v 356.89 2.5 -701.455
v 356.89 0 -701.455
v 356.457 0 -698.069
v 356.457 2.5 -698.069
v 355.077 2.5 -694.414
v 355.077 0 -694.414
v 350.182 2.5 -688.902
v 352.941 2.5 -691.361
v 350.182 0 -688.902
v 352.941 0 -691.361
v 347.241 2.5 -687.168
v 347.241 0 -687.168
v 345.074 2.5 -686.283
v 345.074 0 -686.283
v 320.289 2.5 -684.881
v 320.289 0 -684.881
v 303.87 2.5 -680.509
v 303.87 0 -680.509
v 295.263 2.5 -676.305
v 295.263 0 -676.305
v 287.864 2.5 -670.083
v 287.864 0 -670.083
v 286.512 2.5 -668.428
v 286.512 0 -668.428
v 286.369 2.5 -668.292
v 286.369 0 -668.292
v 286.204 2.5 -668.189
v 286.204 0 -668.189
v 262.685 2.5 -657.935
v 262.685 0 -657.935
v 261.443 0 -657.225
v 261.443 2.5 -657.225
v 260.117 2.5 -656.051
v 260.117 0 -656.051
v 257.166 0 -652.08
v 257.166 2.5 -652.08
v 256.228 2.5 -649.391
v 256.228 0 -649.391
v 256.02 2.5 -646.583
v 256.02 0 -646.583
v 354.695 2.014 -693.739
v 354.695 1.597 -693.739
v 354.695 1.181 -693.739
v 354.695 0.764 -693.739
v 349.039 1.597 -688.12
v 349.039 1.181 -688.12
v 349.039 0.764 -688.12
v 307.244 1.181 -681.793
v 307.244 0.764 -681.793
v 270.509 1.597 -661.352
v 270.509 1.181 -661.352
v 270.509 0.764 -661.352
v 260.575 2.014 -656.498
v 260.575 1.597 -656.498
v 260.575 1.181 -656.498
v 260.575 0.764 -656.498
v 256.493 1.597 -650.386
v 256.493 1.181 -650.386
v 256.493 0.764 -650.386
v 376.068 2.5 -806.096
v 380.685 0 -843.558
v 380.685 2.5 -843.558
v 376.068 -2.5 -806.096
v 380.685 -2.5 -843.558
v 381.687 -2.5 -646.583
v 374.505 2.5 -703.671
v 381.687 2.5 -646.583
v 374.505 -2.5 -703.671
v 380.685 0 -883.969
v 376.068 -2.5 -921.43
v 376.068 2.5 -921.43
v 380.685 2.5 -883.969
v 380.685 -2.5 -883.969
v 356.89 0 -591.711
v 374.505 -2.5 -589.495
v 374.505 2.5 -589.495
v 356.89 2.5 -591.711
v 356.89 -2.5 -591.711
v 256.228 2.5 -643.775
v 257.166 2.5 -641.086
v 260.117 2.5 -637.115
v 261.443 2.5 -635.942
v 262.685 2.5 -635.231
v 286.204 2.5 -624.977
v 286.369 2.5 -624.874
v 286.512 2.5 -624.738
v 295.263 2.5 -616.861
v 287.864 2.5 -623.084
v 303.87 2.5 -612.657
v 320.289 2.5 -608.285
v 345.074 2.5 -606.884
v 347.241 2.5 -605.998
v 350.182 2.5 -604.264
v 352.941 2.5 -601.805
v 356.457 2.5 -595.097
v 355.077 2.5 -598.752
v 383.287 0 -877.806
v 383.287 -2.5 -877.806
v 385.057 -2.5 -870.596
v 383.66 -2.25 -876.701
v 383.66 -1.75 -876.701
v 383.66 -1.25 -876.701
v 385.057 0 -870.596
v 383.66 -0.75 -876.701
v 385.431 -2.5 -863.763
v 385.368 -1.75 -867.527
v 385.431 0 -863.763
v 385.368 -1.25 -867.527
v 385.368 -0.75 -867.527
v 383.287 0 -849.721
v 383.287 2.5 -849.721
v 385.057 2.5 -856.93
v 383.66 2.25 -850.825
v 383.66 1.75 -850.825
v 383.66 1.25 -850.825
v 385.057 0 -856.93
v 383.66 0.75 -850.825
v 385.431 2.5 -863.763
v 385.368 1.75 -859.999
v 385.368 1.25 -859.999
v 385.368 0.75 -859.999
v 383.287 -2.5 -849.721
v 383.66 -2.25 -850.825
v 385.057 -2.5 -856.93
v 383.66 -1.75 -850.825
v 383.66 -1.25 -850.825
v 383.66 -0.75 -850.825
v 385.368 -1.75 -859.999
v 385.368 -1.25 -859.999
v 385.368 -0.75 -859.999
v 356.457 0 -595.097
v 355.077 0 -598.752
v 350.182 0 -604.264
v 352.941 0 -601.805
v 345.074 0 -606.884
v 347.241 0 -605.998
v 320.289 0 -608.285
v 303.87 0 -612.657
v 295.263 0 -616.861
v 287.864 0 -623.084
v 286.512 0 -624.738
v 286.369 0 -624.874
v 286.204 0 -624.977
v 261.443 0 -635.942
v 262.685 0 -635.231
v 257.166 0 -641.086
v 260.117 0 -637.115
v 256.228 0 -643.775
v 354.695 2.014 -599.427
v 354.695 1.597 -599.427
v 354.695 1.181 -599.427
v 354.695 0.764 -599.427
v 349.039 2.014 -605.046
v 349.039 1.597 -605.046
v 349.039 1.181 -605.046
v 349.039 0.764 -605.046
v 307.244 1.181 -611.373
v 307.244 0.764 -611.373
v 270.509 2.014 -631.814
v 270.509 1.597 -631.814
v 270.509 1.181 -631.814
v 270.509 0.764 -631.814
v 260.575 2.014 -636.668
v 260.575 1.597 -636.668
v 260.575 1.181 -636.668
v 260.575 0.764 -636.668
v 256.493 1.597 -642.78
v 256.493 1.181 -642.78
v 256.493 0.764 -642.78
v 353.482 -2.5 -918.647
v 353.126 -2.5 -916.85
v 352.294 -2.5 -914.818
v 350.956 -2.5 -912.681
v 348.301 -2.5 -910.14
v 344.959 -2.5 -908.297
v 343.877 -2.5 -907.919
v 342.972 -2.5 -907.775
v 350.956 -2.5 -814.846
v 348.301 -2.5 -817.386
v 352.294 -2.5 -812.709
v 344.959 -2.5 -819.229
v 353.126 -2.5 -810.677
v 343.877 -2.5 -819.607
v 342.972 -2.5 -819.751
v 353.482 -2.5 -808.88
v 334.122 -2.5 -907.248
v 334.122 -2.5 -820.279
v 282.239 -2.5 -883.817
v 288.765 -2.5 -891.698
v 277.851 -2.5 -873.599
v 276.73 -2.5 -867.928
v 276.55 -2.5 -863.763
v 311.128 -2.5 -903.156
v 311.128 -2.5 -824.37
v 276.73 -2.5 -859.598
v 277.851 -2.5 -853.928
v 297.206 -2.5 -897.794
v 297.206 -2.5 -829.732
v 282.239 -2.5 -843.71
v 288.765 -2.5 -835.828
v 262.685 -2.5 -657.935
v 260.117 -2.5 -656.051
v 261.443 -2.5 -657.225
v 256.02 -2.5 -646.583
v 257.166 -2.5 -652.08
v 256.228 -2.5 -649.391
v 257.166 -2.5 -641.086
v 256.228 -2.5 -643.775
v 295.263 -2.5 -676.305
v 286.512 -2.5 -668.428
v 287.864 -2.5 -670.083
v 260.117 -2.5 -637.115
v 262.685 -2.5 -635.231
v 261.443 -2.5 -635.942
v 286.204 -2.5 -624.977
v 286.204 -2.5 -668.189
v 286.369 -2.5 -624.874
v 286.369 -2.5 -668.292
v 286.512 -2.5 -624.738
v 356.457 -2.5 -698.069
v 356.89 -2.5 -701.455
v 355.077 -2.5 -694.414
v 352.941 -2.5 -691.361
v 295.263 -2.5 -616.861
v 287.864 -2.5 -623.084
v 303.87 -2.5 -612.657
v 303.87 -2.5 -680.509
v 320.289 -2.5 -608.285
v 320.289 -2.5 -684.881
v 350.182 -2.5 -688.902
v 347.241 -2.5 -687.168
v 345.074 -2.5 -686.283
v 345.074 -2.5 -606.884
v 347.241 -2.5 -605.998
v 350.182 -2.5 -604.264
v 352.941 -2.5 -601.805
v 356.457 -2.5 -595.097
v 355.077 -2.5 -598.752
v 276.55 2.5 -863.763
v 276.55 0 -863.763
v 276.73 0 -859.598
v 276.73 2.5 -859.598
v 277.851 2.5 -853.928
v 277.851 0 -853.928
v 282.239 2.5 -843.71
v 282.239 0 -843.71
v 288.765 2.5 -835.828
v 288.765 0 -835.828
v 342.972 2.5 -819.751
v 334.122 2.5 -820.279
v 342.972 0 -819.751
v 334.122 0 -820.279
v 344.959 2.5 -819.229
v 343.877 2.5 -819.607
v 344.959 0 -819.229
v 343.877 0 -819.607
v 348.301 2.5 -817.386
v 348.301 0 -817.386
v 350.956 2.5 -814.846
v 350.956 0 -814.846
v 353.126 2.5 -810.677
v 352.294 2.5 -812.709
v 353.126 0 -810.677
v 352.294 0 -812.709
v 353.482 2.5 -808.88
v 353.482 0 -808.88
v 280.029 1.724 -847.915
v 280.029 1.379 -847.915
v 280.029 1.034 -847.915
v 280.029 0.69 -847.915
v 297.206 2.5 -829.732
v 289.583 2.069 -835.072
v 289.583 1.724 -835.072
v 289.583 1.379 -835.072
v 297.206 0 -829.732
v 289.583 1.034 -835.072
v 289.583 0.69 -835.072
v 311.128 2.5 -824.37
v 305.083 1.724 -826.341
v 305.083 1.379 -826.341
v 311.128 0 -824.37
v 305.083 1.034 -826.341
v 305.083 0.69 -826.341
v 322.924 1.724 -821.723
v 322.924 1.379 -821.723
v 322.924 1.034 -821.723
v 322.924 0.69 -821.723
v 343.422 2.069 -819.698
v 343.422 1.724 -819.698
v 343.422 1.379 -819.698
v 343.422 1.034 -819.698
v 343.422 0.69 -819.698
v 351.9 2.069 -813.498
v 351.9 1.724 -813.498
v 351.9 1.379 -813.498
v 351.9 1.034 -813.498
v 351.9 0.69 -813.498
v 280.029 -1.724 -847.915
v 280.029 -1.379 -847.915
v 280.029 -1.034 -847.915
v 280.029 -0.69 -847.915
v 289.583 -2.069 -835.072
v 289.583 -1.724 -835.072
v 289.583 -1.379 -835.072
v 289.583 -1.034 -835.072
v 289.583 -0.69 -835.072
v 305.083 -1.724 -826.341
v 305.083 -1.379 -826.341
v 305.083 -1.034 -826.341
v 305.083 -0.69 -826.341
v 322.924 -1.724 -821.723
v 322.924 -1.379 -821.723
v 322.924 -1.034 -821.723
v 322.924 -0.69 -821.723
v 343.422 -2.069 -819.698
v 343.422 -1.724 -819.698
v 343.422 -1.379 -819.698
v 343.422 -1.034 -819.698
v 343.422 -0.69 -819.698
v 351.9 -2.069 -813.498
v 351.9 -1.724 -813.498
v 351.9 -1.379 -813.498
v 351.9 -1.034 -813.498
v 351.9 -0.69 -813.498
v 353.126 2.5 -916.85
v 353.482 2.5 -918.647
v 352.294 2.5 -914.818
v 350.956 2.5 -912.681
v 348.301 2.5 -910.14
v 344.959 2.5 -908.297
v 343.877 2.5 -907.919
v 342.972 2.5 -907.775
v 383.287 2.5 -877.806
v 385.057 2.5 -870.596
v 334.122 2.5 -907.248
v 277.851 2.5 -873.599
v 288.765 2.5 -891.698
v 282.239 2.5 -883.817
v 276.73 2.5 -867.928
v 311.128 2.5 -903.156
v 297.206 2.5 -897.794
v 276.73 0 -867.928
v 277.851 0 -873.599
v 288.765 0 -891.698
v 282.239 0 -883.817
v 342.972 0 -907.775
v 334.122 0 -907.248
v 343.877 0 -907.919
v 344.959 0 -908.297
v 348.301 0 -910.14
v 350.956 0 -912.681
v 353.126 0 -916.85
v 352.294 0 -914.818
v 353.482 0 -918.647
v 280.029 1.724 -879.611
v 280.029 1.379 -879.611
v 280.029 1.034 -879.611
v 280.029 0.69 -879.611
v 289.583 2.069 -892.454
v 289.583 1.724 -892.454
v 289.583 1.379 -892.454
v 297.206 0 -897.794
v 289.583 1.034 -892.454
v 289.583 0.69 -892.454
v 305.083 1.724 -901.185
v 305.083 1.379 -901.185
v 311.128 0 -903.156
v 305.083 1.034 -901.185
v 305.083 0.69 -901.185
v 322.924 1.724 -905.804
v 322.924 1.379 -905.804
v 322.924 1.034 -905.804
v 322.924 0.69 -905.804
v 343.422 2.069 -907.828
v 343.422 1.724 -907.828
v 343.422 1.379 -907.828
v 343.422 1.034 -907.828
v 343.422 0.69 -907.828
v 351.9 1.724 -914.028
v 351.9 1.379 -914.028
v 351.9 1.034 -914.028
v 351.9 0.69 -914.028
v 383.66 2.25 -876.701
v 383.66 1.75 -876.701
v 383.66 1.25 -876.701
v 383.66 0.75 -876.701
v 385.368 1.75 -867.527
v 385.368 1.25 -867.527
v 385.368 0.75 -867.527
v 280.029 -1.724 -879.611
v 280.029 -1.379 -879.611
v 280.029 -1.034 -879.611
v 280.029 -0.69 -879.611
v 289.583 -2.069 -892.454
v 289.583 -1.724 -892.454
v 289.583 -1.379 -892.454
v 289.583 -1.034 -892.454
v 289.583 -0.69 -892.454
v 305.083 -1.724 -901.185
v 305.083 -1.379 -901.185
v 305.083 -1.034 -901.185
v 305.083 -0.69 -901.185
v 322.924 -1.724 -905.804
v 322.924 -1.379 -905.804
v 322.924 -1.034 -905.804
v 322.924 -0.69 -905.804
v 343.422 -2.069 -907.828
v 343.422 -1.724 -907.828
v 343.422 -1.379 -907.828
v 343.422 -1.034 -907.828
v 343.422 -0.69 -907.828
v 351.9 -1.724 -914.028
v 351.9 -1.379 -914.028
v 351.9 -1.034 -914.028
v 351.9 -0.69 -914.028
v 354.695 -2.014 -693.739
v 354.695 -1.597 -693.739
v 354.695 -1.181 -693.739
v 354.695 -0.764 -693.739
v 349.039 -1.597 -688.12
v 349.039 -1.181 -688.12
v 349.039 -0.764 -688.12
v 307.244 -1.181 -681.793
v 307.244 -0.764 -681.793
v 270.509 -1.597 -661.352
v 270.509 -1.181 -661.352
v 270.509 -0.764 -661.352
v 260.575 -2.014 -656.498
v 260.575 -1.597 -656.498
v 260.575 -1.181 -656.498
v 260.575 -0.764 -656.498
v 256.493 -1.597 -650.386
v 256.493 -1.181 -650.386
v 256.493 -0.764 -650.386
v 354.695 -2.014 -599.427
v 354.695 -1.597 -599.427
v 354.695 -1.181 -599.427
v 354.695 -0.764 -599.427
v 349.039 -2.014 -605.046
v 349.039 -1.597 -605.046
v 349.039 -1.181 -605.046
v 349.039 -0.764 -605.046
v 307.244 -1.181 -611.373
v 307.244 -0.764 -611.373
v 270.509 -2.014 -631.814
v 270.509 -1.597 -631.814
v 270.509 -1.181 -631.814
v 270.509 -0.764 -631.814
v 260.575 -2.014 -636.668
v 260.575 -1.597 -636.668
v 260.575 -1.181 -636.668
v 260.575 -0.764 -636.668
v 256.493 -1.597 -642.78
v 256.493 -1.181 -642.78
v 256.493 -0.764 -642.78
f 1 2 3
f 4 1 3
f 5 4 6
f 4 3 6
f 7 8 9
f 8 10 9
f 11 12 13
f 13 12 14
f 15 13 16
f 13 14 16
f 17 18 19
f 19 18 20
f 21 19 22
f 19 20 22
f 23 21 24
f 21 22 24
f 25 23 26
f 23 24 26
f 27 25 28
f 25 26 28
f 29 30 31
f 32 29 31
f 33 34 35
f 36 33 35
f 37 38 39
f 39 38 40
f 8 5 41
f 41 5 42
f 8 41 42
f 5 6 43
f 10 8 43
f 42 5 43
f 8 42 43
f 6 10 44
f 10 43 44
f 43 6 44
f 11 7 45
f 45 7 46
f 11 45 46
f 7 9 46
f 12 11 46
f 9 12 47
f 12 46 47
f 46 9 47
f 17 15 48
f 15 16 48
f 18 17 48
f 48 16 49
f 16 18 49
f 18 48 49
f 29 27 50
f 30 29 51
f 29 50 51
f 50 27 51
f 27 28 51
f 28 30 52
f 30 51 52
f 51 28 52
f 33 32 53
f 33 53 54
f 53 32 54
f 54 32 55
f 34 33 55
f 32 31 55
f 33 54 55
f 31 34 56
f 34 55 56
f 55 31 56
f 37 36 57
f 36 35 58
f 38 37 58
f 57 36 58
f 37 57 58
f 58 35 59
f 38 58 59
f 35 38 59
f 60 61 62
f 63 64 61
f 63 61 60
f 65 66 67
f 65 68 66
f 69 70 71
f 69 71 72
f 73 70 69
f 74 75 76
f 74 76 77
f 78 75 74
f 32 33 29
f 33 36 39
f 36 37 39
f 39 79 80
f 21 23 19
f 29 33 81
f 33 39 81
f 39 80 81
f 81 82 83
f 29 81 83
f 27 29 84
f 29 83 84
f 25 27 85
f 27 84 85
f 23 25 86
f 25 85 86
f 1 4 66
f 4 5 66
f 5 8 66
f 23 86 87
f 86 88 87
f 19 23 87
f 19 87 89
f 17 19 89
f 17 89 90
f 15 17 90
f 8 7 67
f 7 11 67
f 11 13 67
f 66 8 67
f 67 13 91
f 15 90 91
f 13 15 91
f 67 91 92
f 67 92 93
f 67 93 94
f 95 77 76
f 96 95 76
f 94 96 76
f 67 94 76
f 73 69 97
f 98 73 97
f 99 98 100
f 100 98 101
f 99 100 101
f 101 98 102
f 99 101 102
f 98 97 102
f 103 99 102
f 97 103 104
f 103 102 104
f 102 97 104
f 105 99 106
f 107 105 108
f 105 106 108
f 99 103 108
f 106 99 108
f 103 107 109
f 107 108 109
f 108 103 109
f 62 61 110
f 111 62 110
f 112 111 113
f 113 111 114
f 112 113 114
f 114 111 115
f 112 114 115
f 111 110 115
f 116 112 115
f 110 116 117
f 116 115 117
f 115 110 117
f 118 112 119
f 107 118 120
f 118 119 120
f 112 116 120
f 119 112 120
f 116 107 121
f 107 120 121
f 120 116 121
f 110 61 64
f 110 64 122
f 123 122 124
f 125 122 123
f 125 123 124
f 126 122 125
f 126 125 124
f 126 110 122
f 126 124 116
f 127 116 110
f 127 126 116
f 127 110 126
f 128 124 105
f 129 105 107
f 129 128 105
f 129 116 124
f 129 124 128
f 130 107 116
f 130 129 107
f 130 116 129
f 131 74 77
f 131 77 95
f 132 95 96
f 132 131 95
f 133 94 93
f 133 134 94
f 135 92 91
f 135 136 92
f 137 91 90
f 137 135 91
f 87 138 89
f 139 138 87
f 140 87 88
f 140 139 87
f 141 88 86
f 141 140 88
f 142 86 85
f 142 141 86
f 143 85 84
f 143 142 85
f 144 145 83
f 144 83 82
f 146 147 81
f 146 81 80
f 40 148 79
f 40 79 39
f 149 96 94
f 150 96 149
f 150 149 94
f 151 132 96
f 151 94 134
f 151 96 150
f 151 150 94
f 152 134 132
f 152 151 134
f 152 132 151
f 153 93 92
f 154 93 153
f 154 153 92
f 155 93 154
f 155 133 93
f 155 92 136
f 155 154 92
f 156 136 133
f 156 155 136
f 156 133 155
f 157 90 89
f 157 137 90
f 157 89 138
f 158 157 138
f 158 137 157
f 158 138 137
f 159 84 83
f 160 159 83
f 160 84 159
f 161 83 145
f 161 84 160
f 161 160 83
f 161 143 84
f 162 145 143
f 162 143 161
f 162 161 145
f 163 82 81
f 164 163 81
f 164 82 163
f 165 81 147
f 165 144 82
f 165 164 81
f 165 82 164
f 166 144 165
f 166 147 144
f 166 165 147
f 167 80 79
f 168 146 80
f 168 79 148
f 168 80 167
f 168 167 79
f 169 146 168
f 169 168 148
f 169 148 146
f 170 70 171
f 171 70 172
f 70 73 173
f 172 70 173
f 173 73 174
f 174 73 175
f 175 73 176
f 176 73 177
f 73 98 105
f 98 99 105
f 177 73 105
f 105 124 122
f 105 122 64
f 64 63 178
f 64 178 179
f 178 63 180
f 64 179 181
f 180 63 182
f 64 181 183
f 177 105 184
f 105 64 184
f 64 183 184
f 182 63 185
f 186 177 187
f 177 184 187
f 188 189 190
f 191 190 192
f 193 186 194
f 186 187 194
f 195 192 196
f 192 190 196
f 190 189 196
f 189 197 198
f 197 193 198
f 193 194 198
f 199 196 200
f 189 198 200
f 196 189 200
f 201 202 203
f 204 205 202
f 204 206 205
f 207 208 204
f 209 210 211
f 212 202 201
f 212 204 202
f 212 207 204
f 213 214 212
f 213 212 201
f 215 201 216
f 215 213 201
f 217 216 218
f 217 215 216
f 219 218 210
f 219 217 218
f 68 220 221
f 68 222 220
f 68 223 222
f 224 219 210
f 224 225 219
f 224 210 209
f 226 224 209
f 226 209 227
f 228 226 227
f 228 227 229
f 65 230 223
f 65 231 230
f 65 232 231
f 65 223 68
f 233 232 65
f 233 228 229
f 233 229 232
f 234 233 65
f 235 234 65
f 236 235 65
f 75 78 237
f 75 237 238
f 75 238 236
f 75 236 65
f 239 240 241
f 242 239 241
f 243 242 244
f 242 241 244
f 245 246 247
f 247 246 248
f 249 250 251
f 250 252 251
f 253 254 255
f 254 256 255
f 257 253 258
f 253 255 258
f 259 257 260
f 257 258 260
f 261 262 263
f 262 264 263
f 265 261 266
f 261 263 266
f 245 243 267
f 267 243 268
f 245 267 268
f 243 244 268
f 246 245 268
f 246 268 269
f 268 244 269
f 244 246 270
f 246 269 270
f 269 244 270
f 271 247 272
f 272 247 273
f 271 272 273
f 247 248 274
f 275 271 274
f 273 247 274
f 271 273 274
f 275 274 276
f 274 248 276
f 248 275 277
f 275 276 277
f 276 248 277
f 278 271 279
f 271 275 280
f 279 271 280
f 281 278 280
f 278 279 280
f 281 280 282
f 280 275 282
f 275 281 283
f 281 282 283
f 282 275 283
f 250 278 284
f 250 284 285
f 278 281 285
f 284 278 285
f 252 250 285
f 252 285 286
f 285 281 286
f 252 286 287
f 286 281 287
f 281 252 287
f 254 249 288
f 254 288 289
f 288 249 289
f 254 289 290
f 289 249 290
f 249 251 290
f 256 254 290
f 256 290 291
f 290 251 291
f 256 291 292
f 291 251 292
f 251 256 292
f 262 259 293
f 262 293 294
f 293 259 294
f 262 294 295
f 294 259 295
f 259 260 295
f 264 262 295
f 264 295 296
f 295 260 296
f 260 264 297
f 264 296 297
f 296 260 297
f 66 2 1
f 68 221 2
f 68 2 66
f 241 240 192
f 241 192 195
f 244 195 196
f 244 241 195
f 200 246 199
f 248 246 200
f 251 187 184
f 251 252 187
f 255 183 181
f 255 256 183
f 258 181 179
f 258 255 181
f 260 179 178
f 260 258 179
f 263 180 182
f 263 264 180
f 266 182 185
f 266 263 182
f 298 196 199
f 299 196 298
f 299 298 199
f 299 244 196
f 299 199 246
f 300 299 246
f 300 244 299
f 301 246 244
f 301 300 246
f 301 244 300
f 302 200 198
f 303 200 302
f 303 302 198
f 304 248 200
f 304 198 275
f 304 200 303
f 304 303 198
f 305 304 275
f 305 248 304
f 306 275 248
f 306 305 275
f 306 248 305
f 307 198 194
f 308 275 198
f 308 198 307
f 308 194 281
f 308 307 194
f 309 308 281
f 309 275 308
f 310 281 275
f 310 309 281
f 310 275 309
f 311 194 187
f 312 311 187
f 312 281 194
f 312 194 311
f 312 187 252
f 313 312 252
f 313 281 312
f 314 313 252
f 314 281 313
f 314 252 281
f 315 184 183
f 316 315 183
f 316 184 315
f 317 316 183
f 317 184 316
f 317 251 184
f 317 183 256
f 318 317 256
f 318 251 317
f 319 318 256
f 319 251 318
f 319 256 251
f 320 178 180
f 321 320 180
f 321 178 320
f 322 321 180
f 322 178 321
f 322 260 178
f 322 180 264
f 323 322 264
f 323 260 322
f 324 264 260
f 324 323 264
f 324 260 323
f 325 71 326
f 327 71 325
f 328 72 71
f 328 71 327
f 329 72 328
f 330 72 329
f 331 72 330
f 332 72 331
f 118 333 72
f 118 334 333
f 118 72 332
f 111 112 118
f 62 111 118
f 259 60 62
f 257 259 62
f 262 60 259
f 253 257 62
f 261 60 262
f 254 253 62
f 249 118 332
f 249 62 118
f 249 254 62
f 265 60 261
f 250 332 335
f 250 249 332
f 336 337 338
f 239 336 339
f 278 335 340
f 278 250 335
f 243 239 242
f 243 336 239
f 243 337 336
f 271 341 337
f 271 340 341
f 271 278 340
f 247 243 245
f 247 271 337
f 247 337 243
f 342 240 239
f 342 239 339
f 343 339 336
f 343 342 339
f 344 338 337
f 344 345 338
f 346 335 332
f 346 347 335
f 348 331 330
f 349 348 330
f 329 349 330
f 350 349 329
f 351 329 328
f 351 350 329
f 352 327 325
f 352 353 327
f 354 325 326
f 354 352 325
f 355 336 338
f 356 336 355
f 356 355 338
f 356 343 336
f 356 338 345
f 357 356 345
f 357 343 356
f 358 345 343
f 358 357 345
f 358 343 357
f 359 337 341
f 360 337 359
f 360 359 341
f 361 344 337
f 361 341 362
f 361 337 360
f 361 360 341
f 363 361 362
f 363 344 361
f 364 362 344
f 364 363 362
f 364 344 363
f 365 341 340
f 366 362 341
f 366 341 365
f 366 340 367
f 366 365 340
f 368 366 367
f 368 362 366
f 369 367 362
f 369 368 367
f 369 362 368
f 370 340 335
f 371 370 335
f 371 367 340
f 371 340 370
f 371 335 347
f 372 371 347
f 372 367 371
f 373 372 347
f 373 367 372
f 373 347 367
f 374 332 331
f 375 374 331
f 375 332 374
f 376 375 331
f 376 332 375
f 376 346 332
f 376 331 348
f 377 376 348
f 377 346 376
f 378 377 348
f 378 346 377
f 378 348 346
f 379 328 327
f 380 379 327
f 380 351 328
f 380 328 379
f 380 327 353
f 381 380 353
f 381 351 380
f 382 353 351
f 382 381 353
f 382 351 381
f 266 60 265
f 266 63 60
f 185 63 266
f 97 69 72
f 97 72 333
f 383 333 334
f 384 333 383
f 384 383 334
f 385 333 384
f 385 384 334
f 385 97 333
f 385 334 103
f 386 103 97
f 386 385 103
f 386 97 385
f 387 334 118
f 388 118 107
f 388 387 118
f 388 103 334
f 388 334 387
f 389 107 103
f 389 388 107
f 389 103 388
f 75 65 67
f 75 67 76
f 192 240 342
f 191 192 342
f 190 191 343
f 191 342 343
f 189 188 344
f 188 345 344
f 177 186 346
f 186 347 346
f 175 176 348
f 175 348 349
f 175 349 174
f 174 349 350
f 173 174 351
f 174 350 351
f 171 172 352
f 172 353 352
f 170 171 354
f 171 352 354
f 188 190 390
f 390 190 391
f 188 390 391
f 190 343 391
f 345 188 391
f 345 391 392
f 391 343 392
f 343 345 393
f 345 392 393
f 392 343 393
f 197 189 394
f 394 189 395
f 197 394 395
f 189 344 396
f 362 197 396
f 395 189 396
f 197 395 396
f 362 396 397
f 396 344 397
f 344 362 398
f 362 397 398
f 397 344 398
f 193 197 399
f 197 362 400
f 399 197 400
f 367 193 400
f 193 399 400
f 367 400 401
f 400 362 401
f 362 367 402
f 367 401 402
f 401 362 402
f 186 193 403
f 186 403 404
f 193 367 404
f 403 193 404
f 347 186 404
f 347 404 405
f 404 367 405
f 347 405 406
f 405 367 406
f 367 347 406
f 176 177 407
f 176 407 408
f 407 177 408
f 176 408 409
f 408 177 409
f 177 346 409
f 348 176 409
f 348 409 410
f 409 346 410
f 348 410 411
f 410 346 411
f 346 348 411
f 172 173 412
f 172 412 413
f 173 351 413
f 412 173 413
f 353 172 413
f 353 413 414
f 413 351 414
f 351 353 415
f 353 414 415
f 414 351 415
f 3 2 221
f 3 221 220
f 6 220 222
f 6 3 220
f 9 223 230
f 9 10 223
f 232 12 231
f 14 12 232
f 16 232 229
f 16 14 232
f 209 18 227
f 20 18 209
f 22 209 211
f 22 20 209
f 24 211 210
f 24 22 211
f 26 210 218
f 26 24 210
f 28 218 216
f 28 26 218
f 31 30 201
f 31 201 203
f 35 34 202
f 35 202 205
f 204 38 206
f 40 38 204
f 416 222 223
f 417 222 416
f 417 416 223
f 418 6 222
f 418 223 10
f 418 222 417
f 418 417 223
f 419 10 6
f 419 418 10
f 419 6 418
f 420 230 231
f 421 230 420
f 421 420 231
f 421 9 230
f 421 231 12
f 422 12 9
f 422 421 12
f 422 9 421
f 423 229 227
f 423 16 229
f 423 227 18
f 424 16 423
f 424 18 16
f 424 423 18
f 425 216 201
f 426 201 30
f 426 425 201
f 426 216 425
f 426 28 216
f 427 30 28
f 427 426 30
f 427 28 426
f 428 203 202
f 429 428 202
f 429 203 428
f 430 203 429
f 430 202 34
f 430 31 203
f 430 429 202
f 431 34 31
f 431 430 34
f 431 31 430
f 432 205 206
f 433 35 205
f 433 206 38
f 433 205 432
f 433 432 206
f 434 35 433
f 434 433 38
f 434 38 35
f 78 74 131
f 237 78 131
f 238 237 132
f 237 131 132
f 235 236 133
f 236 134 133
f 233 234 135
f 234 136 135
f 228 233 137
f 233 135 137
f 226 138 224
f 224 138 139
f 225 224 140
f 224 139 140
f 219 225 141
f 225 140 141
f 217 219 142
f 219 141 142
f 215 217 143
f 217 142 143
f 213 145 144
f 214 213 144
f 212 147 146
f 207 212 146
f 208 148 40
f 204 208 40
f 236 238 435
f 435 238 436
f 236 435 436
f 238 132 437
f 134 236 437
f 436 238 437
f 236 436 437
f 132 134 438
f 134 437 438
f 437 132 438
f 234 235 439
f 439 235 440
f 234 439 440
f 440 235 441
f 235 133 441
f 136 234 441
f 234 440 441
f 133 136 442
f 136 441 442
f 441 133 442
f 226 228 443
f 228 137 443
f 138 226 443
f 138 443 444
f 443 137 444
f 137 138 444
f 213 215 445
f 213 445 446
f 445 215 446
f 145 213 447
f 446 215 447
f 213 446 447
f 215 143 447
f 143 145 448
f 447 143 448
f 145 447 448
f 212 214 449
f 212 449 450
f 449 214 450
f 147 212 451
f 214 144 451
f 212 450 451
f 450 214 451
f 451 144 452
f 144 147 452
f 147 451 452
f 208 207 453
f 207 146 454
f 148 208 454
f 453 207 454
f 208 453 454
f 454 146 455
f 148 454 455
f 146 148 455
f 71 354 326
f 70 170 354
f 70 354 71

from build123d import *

# Parameters (mm, degrees)
F2_DEPTH = 2.5
F3_DEPTH = 2.5


with BuildPart() as f2:
    # F0 (on Front) → F2 (new body, symmetric)
    with BuildSketch(Plane.XZ):
        with BuildLine():
            add(Edge.make_bspline(
                [(276.5497267246, -863.7632131577), (276.54139154, -862.7410607928), (276.5242140475, -860.634567015), (277.1022166285, -857.2190359459), (278.1200119972, -852.3910459093), (279.9644463626, -847.920075237), (281.882477521, -844.1108320488), (284.2328157013, -840.7195439415), (286.5362493086, -837.9587161599), (289.5936271103, -835.000506288), (292.3400546836, -832.6961641976), (296.2659145844, -830.130412678), (299.6643453171, -828.5399335469), (305.0663850146, -826.268512946), (309.3360646257, -824.8757416896), (312.9564352004, -823.8421996168), (317.6327984787, -822.6772317039), (322.9576447247, -821.6792486204), (327.6506784182, -821.0164327637), (333.6132370505, -820.2629074866), (338.8503029875, -819.9387231038), (343.3844263767, -819.8004298323), (344.3448504869, -819.4552650149), (346.0335944536, -818.8448689071), (347.9511294829, -817.7280349749), (349.3725650959, -816.4916329208), (350.7417247639, -815.1633378239), (351.9811492056, -813.5631564799), (352.7690672299, -811.5551372984), (353.3514105804, -810.1866277081), (353.4392877312, -809.3047006151), (353.4816205502, -808.8798522949)],
                knots=[0, 0, 0, 0, 0.0324890162, 0.0669547054, 0.1081802891, 0.1491810039, 0.1875163578, 0.2248555747, 0.2602249162, 0.2980544802, 0.3336595835, 0.3731210496, 0.4096347547, 0.4543596768, 0.4938824362, 0.5294823691, 0.5701914519, 0.6133278299, 0.6539418391, 0.6990842242, 0.7431419032, 0.781359162, 0.7997387654, 0.8239445073, 0.8518738715, 0.8773527921, 0.902774255, 0.9292457632, 0.9564521361, 0.979021807, 1, 1, 1, 1], degree=3))
            add(Edge.make_bspline(
                [(276.5497267246, -863.7632131577), (276.54139154, -864.7853655225), (276.5242140475, -866.8918593003), (277.1022166285, -870.3073903695), (278.1200119972, -875.135380406), (279.9644463626, -879.6063510783), (281.882477521, -883.4155942665), (284.2328157013, -886.8068823739), (286.5362493086, -889.5677101554), (289.5936271103, -892.5259200273), (292.3400546836, -894.8302621177), (296.2659145844, -897.3960136373), (299.6643453171, -898.9864927685), (305.0663850146, -901.2579133693), (309.3360646257, -902.6506846257), (312.9564352004, -903.6842266986), (317.6327984787, -904.8491946114), (322.9576447247, -905.8471776949), (327.6506784182, -906.5099935516), (333.6132370505, -907.2635188288), (338.8503029875, -907.5877032115), (343.3844263767, -907.725996483), (344.3448504869, -908.0711613004), (346.0335944536, -908.6815574082), (347.9511294829, -909.7983913404), (349.3725650959, -911.0347933945), (350.7417247639, -912.3630884914), (351.9811492056, -913.9632698354), (352.7690672299, -915.9712890169), (353.3514105804, -917.3397986072), (353.4392877312, -918.2217257003), (353.4816205502, -918.6465740204)],
                knots=[0, 0, 0, 0, 0.0324890162, 0.0669547054, 0.1081802891, 0.1491810039, 0.1875163578, 0.2248555747, 0.2602249162, 0.2980544802, 0.3336595835, 0.3731210496, 0.4096347547, 0.4543596768, 0.4938824362, 0.5294823691, 0.5701914519, 0.6133278299, 0.6539418391, 0.6990842242, 0.7431419032, 0.781359162, 0.7997387654, 0.8239445073, 0.8518738715, 0.8773527921, 0.902774255, 0.9292457632, 0.9564521361, 0.979021807, 1, 1, 1, 1], degree=3))
            Line((353.4816205502, -918.6465740204), (376.0677278042, -921.4302301407))
            Line((376.0677278042, -921.4302301407), (380.6847454311, -883.9685427737))
            add(Edge.make_bspline(
                [(380.6847454311, -883.9685427737), (380.9214832769, -883.5956659994), (381.4419031281, -882.7759724907), (382.1644757035, -880.9088927645), (382.8901405387, -878.8474582057), (383.7158613081, -876.7090404288), (384.2166534232, -874.4777597275), (384.8417878024, -872.0960355715), (385.1994576942, -869.6921520058), (385.3882722832, -867.5518849454), (385.4408510014, -865.5143988966), (385.4343144479, -864.3319522707), (385.4311704636, -863.7632131577)],
                knots=[0, 0, 0, 0, 0.0814268321, 0.1790002764, 0.2822084214, 0.3867918981, 0.4914951728, 0.6003367786, 0.7083653302, 0.8101208926, 0.9086709939, 1, 1, 1, 1], degree=3))
            add(Edge.make_bspline(
                [(380.6847454311, -843.5578835416), (380.9214832769, -843.930760316), (381.4419031281, -844.7504538246), (382.1644757035, -846.6175335508), (382.8901405387, -848.6789681096), (383.7158613081, -850.8173858866), (384.2166534232, -853.0486665878), (384.8417878024, -855.4303907438), (385.1994576942, -857.8342743095), (385.3882722832, -859.9745413699), (385.4408510014, -862.0120274187), (385.4343144479, -863.1944740446), (385.4311704636, -863.7632131577)],
                knots=[0, 0, 0, 0, 0.0814268321, 0.1790002764, 0.2822084214, 0.3867918981, 0.4914951728, 0.6003367786, 0.7083653302, 0.8101208926, 0.9086709939, 1, 1, 1, 1], degree=3))
            Line((380.6847454311, -843.5578835416), (376.0677278042, -806.0961961746))
            Line((376.0677278042, -806.0961961746), (353.4816205502, -808.8798522949))
        make_face()
    extrude(amount=F2_DEPTH, both=True)


with BuildPart() as f3:
    # F1 (on Front) → F3 (new body, symmetric)
    with BuildSketch(Plane.XZ):
        with BuildLine():
            Line((374.5049238205, -703.6713957787), (381.6874027252, -646.5831398964))
            Line((381.6874027252, -646.5831398964), (374.5049238205, -589.4948840141))
            Line((374.5049238205, -589.4948840141), (356.8896192521, -591.7111288706))
            add(Edge.make_bspline(
                [(356.8896192521, -591.7111288706), (356.8910177633, -592.1523325596), (356.8943377862, -593.1997366717), (356.3073050321, -595.9137830966), (355.4467654844, -598.1904591127), (354.0585001566, -600.5388582073), (352.6873645683, -602.135716309), (350.9665607975, -603.7155875422), (349.0350842805, -605.1081007643), (347.5427588661, -605.8644672065), (345.3333915642, -606.9018270012), (344.725838446, -606.8790475218), (337.8162304679, -606.9172964432), (333.6910101123, -607.003750362), (328.1040964297, -607.5704799414), (323.6513343785, -607.7748307014), (318.7105955425, -608.5024950112), (314.7909213134, -609.2960332607), (311.0587566112, -610.1758493543), (307.2236533503, -611.3086532279), (302.9108408394, -613.0320653716), (299.2041941793, -614.6042334051), (295.1238309374, -616.8442837476), (292.1300482064, -619.0162438487), (289.6871533773, -621.0523561811), (287.0195132429, -623.9809835501), (286.4469174267, -624.9032581264), (285.5689437601, -625.2209054184), (277.7659381818, -628.5789161222), (271.0392467124, -631.6094203453), (263.4329905418, -634.8738035347), (261.5022317441, -635.7700385299), (259.7154155104, -637.453468299), (258.2491019333, -639.2919805919), (257.1643397272, -640.9396026311), (256.450399475, -642.7677088753), (255.9917021612, -644.6764396633), (256.0725133173, -645.9749144154), (256.02003932, -646.5831398964)],
                knots=[0, 0, 0, 0, 0.0187706041, 0.0445350384, 0.0693680867, 0.0948221811, 0.117471499, 0.1413415351, 0.1650814617, 0.1862018706, 0.2094514417, 0.2223223226, 0.2618726508, 0.2960087594, 0.3320285773, 0.3654677524, 0.4000773346, 0.4313733955, 0.4616216981, 0.492917745, 0.5263709666, 0.5579700605, 0.5915215179, 0.6212761869, 0.6498376776, 0.6806401009, 0.6957358398, 0.7093623435, 0.7532221493, 0.799198821, 0.8428096635, 0.8653796588, 0.889098214, 0.9132176898, 0.9350343068, 0.9567490413, 0.9785639435, 1, 1, 1, 1], degree=3))
            add(Edge.make_bspline(
                [(356.8896192521, -701.4551509222), (356.8910177633, -701.0139472331), (356.8943377862, -699.966543121), (356.3073050321, -697.2524966962), (355.4467654844, -694.9758206801), (354.0585001566, -692.6274215855), (352.6873645683, -691.0305634838), (350.9665607975, -689.4506922506), (349.0350842805, -688.0581790285), (347.5427588661, -687.3018125863), (345.3333915642, -686.2644527916), (344.725838446, -686.287232271), (337.8162304679, -686.2489833495), (333.6910101123, -686.1625294308), (328.1040964297, -685.5957998513), (323.6513343785, -685.3914490914), (318.7105955425, -684.6637847816), (314.7909213134, -683.8702465321), (311.0587566112, -682.9904304384), (307.2236533503, -681.8576265648), (302.9108408394, -680.1342144212), (299.2041941793, -678.5620463877), (295.1238309374, -676.3219960452), (292.1300482064, -674.1500359441), (289.6871533773, -672.1139236117), (287.0195132429, -669.1852962426), (286.4469174267, -668.2630216664), (285.5689437601, -667.9453743743), (277.7659381818, -664.5873636706), (271.0392467124, -661.5568594475), (263.4329905418, -658.2924762581), (261.5022317441, -657.3962412629), (259.7154155104, -655.7128114938), (258.2491019333, -653.8742992009), (257.1643397272, -652.2266771617), (256.450399475, -650.3985709175), (255.9917021612, -648.4898401295), (256.0725133173, -647.1913653774), (256.02003932, -646.5831398964)],
                knots=[0, 0, 0, 0, 0.0187706041, 0.0445350384, 0.0693680867, 0.0948221811, 0.117471499, 0.1413415351, 0.1650814617, 0.1862018706, 0.2094514417, 0.2223223226, 0.2618726508, 0.2960087594, 0.3320285773, 0.3654677524, 0.4000773346, 0.4313733955, 0.4616216981, 0.492917745, 0.5263709666, 0.5579700605, 0.5915215179, 0.6212761869, 0.6498376776, 0.6806401009, 0.6957358398, 0.7093623435, 0.7532221493, 0.799198821, 0.8428096635, 0.8653796588, 0.889098214, 0.9132176898, 0.9350343068, 0.9567490413, 0.9785639435, 1, 1, 1, 1], degree=3))
            Line((356.8896192521, -701.4551509222), (374.5049238205, -703.6713957787))
        make_face()
    extrude(amount=F3_DEPTH, both=True)


solid = Compound([f2.part, f3.part])
